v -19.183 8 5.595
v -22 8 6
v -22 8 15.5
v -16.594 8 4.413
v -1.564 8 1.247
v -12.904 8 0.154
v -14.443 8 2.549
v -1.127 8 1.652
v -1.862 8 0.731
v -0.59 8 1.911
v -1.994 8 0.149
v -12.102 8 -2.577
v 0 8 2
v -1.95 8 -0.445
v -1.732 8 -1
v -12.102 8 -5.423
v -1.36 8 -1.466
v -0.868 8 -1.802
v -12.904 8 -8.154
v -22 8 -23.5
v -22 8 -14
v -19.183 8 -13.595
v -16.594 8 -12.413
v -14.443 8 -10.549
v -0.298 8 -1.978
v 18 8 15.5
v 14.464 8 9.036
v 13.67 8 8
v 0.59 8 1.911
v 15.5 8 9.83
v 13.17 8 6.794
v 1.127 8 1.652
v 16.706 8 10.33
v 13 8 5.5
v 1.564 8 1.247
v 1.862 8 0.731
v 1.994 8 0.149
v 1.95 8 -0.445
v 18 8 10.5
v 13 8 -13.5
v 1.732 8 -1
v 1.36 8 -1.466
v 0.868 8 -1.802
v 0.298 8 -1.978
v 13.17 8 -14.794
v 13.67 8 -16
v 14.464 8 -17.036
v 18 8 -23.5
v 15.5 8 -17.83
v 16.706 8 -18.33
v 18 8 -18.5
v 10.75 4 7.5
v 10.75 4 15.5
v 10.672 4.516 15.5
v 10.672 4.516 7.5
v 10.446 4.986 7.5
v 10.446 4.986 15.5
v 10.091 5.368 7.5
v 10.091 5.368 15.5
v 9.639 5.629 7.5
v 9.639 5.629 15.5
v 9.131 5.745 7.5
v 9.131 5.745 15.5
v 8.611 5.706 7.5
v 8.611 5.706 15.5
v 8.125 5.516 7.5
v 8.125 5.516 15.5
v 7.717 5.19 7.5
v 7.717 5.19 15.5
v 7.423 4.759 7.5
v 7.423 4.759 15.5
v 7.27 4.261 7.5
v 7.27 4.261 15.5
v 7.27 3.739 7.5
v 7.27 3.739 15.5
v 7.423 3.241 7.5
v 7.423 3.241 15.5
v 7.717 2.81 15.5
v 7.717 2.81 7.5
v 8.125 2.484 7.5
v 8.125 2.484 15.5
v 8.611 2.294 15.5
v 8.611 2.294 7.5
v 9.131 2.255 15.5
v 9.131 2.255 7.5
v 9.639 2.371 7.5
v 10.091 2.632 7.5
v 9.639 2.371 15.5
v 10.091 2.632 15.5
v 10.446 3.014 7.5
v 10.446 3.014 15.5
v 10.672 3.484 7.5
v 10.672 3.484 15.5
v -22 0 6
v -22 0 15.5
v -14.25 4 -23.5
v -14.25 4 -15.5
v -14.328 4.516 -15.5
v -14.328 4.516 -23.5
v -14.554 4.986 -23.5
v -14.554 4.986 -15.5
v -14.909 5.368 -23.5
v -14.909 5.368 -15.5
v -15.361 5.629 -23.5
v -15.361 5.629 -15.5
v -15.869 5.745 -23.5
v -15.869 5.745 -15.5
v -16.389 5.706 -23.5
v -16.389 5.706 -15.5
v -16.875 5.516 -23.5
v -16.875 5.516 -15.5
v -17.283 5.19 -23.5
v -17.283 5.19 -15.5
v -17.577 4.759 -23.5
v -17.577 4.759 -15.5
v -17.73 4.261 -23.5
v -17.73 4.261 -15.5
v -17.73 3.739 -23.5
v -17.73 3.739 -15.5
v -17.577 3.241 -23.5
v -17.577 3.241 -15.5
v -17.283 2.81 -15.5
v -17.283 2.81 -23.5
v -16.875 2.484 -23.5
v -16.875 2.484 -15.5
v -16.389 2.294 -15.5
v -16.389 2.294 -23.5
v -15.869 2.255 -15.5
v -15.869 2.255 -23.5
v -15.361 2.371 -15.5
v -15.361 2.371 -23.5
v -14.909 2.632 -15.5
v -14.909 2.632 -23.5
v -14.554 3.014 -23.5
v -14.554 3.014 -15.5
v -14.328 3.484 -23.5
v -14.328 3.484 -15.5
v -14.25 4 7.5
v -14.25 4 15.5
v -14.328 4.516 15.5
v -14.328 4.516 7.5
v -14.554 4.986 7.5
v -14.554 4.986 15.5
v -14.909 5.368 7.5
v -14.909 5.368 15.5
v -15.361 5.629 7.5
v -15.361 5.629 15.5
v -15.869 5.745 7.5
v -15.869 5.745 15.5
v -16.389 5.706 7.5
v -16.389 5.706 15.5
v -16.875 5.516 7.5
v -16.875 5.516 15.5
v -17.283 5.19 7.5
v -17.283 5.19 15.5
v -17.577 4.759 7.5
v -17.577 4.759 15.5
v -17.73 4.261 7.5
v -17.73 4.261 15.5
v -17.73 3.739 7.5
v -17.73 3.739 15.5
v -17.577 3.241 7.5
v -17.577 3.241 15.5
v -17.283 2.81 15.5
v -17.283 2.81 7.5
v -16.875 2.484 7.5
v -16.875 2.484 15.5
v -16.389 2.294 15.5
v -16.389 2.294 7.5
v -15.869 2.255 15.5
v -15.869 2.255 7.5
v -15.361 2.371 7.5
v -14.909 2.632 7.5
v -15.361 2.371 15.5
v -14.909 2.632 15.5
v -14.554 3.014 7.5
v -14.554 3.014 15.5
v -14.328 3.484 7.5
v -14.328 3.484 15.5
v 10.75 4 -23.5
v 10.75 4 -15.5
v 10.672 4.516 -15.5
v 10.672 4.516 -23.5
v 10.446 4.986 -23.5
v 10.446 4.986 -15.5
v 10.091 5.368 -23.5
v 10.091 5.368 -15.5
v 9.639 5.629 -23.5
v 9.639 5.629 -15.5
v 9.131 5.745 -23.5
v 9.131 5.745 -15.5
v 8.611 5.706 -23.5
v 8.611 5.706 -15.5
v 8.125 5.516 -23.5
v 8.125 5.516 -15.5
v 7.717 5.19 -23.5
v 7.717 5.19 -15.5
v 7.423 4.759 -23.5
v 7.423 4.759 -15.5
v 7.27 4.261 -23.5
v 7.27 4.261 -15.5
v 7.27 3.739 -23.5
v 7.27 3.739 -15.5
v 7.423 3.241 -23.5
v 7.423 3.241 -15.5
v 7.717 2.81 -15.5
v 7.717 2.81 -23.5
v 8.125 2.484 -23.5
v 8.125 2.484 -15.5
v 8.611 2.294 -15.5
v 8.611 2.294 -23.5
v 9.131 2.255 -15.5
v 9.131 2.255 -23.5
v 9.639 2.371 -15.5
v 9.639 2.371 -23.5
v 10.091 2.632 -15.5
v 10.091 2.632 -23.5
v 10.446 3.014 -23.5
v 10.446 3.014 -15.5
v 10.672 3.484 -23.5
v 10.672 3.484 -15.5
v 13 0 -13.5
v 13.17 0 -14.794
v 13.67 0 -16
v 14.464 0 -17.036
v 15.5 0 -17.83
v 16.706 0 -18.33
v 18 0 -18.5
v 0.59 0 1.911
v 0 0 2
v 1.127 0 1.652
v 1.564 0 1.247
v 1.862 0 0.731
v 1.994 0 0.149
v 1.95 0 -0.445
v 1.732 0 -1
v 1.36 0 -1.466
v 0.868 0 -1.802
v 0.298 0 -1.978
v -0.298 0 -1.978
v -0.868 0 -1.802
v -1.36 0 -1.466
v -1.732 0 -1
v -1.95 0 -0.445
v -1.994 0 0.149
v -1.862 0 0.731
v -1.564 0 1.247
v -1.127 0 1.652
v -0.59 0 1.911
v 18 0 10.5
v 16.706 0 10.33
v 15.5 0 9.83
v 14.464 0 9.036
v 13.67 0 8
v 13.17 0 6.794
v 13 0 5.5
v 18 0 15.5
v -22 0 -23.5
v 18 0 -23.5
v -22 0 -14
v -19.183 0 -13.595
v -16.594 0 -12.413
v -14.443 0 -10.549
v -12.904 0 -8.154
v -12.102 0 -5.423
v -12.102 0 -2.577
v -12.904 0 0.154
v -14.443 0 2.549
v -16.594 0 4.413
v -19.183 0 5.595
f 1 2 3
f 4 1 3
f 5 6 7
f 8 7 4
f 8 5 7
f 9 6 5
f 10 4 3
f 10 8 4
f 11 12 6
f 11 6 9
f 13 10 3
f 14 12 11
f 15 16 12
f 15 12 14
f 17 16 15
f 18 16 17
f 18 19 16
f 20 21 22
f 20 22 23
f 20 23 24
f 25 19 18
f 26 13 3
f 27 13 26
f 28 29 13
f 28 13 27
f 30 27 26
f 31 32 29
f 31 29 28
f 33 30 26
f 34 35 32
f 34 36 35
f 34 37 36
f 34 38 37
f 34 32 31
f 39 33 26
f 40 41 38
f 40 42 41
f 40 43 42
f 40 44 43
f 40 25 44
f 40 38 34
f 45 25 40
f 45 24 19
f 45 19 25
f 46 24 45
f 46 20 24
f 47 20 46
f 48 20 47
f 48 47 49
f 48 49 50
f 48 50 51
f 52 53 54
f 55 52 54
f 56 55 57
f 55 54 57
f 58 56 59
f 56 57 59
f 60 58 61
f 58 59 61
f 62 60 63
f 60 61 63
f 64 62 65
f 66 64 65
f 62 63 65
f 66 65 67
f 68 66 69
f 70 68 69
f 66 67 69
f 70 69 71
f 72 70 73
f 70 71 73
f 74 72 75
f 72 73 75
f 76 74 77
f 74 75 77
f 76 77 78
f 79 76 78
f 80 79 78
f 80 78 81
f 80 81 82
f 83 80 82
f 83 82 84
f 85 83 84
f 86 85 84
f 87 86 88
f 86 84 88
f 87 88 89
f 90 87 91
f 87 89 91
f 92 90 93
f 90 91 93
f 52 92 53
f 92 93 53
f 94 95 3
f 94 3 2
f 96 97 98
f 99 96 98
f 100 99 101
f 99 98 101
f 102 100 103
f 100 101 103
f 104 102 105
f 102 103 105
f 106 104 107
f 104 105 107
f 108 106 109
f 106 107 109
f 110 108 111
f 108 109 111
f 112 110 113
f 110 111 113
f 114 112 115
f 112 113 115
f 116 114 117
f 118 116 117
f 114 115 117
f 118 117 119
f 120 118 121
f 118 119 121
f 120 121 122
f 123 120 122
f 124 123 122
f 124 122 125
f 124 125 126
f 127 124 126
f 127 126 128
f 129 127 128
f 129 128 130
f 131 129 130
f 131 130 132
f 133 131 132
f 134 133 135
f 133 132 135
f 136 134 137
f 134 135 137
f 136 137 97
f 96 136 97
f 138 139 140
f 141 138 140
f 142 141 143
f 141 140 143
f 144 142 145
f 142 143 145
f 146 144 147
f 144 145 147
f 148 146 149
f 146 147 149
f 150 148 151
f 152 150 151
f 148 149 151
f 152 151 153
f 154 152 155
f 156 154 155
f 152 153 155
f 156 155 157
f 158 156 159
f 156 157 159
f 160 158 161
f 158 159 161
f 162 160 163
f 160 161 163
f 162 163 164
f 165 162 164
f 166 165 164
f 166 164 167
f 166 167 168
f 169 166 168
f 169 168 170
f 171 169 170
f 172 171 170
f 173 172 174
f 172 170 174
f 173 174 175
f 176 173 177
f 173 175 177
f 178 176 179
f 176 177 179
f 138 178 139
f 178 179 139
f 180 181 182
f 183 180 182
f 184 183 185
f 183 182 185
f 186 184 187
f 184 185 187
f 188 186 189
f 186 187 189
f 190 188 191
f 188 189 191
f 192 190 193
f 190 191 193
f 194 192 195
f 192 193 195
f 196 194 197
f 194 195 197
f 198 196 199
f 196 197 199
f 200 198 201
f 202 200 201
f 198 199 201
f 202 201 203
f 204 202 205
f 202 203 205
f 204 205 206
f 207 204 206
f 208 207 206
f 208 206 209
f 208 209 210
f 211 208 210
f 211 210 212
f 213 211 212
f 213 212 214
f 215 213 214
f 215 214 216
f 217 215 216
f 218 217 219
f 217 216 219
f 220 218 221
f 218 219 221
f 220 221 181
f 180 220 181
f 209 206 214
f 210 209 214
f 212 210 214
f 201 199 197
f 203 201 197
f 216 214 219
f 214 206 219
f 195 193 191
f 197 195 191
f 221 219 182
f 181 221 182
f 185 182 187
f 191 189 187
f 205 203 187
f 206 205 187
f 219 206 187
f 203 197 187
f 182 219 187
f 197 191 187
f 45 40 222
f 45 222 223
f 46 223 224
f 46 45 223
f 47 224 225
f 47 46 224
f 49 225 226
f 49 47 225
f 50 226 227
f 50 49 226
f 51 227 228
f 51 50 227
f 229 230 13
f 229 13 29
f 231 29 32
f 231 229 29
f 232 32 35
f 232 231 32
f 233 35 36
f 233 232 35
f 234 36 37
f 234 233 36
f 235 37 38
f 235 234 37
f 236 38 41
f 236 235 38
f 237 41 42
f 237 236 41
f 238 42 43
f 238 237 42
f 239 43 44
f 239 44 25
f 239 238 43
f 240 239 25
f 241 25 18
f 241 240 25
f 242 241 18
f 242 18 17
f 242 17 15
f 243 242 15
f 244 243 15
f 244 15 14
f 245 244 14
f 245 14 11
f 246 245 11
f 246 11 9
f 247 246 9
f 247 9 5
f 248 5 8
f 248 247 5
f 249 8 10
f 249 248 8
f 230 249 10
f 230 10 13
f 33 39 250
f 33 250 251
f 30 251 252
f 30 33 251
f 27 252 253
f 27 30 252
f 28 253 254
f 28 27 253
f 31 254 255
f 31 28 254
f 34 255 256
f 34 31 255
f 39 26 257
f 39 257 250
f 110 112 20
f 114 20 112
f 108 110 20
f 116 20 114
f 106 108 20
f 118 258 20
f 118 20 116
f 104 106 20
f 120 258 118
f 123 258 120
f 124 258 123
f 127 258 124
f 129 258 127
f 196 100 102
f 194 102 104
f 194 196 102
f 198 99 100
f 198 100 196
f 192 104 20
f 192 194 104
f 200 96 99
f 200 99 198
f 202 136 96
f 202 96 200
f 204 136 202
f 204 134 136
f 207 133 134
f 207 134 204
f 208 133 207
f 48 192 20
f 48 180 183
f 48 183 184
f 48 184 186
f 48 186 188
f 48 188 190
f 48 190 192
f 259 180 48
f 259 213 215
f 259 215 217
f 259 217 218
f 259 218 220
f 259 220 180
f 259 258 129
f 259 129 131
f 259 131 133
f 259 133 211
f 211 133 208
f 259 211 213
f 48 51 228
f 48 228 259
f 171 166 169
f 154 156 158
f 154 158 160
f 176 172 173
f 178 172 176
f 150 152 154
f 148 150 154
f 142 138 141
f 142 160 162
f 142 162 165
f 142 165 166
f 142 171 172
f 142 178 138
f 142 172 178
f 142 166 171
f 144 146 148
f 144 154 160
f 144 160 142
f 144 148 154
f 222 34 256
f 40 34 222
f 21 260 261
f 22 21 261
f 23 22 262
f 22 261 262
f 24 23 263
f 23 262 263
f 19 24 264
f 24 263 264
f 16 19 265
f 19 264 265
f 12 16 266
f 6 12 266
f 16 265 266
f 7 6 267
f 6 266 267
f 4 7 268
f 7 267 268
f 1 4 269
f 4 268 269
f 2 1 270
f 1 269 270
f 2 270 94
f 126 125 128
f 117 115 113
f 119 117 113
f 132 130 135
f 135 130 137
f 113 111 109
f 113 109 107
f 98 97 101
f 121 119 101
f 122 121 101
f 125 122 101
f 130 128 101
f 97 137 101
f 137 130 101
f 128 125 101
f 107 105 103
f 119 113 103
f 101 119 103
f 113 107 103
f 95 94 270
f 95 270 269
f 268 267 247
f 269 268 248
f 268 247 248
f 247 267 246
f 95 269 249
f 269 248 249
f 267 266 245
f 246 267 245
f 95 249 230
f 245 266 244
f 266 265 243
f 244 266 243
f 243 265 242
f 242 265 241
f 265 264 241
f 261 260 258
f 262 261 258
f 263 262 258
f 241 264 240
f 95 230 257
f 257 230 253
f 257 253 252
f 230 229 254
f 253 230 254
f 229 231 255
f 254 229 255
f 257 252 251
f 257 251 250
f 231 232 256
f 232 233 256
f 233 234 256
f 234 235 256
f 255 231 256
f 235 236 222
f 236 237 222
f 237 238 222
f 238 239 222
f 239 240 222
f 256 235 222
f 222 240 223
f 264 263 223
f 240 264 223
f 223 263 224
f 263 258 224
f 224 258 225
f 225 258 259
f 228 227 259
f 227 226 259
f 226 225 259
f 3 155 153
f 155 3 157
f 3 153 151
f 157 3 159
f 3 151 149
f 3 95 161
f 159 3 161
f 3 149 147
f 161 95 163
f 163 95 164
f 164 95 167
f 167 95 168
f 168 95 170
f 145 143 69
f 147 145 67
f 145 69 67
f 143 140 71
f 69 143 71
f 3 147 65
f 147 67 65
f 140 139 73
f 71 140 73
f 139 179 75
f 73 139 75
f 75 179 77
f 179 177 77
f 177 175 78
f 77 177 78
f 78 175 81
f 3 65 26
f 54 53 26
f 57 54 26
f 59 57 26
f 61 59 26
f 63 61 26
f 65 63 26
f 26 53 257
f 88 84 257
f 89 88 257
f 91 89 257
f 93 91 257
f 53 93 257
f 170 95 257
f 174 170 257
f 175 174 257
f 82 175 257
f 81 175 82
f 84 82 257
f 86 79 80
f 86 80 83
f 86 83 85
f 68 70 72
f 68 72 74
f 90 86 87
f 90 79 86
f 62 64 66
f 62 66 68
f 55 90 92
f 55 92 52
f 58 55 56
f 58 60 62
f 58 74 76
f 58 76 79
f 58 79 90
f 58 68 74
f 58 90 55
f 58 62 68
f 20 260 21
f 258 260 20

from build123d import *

# Parameters (mm, degrees)
SKETCH_1_W          = 40
SKETCH_1_H          = 39
SKETCH_1_R          = 2
EXTRUDE_1_DEPTH     = 8
SKETCH_2_R          = 1.75
CUT_EXTRUDE_1_DEPTH = 8
CUT_EXTRUDE_START   = -31
SKETCH_2_3_R        = 1.75
CUT_EXTRUDE_2_DEPTH = 8
SKETCH_4_R          = 10
CUT_EXTRUDE_3_DEPTH = 10
CUT_EXTRUDE_5_DEPTH = 10


with BuildPart() as part:
    # 草图1 → 凸台-拉伸1 (new body)
    with BuildSketch(Plane(origin=(0, 0, 0), x_dir=(1, 0, 0), z_dir=(0, 1, 0))):
        with Locations((-2, 4)):
            Rectangle(SKETCH_1_W, SKETCH_1_H)
        with Locations(Location((0, 0, 0), (0, 0, 270))):
            Circle(SKETCH_1_R, mode=Mode.SUBTRACT)
    extrude(amount=EXTRUDE_1_DEPTH)

    # 草图2 → 切除-拉伸1 (cut)
    with BuildSketch(Plane.XY.offset(15.5)):
        with Locations((9, 4)):
            Circle(SKETCH_2_R)
        with Locations((-16, 4)):
            Circle(SKETCH_2_R)
    extrude(amount=-CUT_EXTRUDE_1_DEPTH, mode=Mode.SUBTRACT)

    # 草图2<3> → 切除-拉伸2 (cut)
    with BuildSketch(Plane.XY.offset(15.5).offset(CUT_EXTRUDE_START)):
        with Locations((9, 4)):
            Circle(SKETCH_2_3_R)
        with Locations((-16, 4)):
            Circle(SKETCH_2_3_R)
    extrude(amount=-CUT_EXTRUDE_2_DEPTH, mode=Mode.SUBTRACT)

    # 草图4 → 切除-拉伸3 (cut)
    with BuildSketch(Plane(origin=(0, 0, 0), x_dir=(-1, 0, 0), z_dir=(0, -1, 0))):
        with Locations((22, 4)):
            Circle(SKETCH_4_R)
    extrude(amount=-CUT_EXTRUDE_3_DEPTH, mode=Mode.SUBTRACT)

    # 草图6 → 切除-拉伸5 (cut)
    with BuildSketch(Plane(origin=(0, 8, 0), x_dir=(1, 0, 0), z_dir=(0, 1, 0))):
        with BuildLine():
            Line((13, -5.5), (13, 13.5))
            ThreePointArc((13, 13.5), (18, 18.5), (23, 13.5))
            Line((23, 13.5), (23, -5.5))
            ThreePointArc((23, -5.5), (18, -10.5), (13, -5.5))
        make_face()
    extrude(amount=-CUT_EXTRUDE_5_DEPTH, mode=Mode.SUBTRACT)


solid = part.part
